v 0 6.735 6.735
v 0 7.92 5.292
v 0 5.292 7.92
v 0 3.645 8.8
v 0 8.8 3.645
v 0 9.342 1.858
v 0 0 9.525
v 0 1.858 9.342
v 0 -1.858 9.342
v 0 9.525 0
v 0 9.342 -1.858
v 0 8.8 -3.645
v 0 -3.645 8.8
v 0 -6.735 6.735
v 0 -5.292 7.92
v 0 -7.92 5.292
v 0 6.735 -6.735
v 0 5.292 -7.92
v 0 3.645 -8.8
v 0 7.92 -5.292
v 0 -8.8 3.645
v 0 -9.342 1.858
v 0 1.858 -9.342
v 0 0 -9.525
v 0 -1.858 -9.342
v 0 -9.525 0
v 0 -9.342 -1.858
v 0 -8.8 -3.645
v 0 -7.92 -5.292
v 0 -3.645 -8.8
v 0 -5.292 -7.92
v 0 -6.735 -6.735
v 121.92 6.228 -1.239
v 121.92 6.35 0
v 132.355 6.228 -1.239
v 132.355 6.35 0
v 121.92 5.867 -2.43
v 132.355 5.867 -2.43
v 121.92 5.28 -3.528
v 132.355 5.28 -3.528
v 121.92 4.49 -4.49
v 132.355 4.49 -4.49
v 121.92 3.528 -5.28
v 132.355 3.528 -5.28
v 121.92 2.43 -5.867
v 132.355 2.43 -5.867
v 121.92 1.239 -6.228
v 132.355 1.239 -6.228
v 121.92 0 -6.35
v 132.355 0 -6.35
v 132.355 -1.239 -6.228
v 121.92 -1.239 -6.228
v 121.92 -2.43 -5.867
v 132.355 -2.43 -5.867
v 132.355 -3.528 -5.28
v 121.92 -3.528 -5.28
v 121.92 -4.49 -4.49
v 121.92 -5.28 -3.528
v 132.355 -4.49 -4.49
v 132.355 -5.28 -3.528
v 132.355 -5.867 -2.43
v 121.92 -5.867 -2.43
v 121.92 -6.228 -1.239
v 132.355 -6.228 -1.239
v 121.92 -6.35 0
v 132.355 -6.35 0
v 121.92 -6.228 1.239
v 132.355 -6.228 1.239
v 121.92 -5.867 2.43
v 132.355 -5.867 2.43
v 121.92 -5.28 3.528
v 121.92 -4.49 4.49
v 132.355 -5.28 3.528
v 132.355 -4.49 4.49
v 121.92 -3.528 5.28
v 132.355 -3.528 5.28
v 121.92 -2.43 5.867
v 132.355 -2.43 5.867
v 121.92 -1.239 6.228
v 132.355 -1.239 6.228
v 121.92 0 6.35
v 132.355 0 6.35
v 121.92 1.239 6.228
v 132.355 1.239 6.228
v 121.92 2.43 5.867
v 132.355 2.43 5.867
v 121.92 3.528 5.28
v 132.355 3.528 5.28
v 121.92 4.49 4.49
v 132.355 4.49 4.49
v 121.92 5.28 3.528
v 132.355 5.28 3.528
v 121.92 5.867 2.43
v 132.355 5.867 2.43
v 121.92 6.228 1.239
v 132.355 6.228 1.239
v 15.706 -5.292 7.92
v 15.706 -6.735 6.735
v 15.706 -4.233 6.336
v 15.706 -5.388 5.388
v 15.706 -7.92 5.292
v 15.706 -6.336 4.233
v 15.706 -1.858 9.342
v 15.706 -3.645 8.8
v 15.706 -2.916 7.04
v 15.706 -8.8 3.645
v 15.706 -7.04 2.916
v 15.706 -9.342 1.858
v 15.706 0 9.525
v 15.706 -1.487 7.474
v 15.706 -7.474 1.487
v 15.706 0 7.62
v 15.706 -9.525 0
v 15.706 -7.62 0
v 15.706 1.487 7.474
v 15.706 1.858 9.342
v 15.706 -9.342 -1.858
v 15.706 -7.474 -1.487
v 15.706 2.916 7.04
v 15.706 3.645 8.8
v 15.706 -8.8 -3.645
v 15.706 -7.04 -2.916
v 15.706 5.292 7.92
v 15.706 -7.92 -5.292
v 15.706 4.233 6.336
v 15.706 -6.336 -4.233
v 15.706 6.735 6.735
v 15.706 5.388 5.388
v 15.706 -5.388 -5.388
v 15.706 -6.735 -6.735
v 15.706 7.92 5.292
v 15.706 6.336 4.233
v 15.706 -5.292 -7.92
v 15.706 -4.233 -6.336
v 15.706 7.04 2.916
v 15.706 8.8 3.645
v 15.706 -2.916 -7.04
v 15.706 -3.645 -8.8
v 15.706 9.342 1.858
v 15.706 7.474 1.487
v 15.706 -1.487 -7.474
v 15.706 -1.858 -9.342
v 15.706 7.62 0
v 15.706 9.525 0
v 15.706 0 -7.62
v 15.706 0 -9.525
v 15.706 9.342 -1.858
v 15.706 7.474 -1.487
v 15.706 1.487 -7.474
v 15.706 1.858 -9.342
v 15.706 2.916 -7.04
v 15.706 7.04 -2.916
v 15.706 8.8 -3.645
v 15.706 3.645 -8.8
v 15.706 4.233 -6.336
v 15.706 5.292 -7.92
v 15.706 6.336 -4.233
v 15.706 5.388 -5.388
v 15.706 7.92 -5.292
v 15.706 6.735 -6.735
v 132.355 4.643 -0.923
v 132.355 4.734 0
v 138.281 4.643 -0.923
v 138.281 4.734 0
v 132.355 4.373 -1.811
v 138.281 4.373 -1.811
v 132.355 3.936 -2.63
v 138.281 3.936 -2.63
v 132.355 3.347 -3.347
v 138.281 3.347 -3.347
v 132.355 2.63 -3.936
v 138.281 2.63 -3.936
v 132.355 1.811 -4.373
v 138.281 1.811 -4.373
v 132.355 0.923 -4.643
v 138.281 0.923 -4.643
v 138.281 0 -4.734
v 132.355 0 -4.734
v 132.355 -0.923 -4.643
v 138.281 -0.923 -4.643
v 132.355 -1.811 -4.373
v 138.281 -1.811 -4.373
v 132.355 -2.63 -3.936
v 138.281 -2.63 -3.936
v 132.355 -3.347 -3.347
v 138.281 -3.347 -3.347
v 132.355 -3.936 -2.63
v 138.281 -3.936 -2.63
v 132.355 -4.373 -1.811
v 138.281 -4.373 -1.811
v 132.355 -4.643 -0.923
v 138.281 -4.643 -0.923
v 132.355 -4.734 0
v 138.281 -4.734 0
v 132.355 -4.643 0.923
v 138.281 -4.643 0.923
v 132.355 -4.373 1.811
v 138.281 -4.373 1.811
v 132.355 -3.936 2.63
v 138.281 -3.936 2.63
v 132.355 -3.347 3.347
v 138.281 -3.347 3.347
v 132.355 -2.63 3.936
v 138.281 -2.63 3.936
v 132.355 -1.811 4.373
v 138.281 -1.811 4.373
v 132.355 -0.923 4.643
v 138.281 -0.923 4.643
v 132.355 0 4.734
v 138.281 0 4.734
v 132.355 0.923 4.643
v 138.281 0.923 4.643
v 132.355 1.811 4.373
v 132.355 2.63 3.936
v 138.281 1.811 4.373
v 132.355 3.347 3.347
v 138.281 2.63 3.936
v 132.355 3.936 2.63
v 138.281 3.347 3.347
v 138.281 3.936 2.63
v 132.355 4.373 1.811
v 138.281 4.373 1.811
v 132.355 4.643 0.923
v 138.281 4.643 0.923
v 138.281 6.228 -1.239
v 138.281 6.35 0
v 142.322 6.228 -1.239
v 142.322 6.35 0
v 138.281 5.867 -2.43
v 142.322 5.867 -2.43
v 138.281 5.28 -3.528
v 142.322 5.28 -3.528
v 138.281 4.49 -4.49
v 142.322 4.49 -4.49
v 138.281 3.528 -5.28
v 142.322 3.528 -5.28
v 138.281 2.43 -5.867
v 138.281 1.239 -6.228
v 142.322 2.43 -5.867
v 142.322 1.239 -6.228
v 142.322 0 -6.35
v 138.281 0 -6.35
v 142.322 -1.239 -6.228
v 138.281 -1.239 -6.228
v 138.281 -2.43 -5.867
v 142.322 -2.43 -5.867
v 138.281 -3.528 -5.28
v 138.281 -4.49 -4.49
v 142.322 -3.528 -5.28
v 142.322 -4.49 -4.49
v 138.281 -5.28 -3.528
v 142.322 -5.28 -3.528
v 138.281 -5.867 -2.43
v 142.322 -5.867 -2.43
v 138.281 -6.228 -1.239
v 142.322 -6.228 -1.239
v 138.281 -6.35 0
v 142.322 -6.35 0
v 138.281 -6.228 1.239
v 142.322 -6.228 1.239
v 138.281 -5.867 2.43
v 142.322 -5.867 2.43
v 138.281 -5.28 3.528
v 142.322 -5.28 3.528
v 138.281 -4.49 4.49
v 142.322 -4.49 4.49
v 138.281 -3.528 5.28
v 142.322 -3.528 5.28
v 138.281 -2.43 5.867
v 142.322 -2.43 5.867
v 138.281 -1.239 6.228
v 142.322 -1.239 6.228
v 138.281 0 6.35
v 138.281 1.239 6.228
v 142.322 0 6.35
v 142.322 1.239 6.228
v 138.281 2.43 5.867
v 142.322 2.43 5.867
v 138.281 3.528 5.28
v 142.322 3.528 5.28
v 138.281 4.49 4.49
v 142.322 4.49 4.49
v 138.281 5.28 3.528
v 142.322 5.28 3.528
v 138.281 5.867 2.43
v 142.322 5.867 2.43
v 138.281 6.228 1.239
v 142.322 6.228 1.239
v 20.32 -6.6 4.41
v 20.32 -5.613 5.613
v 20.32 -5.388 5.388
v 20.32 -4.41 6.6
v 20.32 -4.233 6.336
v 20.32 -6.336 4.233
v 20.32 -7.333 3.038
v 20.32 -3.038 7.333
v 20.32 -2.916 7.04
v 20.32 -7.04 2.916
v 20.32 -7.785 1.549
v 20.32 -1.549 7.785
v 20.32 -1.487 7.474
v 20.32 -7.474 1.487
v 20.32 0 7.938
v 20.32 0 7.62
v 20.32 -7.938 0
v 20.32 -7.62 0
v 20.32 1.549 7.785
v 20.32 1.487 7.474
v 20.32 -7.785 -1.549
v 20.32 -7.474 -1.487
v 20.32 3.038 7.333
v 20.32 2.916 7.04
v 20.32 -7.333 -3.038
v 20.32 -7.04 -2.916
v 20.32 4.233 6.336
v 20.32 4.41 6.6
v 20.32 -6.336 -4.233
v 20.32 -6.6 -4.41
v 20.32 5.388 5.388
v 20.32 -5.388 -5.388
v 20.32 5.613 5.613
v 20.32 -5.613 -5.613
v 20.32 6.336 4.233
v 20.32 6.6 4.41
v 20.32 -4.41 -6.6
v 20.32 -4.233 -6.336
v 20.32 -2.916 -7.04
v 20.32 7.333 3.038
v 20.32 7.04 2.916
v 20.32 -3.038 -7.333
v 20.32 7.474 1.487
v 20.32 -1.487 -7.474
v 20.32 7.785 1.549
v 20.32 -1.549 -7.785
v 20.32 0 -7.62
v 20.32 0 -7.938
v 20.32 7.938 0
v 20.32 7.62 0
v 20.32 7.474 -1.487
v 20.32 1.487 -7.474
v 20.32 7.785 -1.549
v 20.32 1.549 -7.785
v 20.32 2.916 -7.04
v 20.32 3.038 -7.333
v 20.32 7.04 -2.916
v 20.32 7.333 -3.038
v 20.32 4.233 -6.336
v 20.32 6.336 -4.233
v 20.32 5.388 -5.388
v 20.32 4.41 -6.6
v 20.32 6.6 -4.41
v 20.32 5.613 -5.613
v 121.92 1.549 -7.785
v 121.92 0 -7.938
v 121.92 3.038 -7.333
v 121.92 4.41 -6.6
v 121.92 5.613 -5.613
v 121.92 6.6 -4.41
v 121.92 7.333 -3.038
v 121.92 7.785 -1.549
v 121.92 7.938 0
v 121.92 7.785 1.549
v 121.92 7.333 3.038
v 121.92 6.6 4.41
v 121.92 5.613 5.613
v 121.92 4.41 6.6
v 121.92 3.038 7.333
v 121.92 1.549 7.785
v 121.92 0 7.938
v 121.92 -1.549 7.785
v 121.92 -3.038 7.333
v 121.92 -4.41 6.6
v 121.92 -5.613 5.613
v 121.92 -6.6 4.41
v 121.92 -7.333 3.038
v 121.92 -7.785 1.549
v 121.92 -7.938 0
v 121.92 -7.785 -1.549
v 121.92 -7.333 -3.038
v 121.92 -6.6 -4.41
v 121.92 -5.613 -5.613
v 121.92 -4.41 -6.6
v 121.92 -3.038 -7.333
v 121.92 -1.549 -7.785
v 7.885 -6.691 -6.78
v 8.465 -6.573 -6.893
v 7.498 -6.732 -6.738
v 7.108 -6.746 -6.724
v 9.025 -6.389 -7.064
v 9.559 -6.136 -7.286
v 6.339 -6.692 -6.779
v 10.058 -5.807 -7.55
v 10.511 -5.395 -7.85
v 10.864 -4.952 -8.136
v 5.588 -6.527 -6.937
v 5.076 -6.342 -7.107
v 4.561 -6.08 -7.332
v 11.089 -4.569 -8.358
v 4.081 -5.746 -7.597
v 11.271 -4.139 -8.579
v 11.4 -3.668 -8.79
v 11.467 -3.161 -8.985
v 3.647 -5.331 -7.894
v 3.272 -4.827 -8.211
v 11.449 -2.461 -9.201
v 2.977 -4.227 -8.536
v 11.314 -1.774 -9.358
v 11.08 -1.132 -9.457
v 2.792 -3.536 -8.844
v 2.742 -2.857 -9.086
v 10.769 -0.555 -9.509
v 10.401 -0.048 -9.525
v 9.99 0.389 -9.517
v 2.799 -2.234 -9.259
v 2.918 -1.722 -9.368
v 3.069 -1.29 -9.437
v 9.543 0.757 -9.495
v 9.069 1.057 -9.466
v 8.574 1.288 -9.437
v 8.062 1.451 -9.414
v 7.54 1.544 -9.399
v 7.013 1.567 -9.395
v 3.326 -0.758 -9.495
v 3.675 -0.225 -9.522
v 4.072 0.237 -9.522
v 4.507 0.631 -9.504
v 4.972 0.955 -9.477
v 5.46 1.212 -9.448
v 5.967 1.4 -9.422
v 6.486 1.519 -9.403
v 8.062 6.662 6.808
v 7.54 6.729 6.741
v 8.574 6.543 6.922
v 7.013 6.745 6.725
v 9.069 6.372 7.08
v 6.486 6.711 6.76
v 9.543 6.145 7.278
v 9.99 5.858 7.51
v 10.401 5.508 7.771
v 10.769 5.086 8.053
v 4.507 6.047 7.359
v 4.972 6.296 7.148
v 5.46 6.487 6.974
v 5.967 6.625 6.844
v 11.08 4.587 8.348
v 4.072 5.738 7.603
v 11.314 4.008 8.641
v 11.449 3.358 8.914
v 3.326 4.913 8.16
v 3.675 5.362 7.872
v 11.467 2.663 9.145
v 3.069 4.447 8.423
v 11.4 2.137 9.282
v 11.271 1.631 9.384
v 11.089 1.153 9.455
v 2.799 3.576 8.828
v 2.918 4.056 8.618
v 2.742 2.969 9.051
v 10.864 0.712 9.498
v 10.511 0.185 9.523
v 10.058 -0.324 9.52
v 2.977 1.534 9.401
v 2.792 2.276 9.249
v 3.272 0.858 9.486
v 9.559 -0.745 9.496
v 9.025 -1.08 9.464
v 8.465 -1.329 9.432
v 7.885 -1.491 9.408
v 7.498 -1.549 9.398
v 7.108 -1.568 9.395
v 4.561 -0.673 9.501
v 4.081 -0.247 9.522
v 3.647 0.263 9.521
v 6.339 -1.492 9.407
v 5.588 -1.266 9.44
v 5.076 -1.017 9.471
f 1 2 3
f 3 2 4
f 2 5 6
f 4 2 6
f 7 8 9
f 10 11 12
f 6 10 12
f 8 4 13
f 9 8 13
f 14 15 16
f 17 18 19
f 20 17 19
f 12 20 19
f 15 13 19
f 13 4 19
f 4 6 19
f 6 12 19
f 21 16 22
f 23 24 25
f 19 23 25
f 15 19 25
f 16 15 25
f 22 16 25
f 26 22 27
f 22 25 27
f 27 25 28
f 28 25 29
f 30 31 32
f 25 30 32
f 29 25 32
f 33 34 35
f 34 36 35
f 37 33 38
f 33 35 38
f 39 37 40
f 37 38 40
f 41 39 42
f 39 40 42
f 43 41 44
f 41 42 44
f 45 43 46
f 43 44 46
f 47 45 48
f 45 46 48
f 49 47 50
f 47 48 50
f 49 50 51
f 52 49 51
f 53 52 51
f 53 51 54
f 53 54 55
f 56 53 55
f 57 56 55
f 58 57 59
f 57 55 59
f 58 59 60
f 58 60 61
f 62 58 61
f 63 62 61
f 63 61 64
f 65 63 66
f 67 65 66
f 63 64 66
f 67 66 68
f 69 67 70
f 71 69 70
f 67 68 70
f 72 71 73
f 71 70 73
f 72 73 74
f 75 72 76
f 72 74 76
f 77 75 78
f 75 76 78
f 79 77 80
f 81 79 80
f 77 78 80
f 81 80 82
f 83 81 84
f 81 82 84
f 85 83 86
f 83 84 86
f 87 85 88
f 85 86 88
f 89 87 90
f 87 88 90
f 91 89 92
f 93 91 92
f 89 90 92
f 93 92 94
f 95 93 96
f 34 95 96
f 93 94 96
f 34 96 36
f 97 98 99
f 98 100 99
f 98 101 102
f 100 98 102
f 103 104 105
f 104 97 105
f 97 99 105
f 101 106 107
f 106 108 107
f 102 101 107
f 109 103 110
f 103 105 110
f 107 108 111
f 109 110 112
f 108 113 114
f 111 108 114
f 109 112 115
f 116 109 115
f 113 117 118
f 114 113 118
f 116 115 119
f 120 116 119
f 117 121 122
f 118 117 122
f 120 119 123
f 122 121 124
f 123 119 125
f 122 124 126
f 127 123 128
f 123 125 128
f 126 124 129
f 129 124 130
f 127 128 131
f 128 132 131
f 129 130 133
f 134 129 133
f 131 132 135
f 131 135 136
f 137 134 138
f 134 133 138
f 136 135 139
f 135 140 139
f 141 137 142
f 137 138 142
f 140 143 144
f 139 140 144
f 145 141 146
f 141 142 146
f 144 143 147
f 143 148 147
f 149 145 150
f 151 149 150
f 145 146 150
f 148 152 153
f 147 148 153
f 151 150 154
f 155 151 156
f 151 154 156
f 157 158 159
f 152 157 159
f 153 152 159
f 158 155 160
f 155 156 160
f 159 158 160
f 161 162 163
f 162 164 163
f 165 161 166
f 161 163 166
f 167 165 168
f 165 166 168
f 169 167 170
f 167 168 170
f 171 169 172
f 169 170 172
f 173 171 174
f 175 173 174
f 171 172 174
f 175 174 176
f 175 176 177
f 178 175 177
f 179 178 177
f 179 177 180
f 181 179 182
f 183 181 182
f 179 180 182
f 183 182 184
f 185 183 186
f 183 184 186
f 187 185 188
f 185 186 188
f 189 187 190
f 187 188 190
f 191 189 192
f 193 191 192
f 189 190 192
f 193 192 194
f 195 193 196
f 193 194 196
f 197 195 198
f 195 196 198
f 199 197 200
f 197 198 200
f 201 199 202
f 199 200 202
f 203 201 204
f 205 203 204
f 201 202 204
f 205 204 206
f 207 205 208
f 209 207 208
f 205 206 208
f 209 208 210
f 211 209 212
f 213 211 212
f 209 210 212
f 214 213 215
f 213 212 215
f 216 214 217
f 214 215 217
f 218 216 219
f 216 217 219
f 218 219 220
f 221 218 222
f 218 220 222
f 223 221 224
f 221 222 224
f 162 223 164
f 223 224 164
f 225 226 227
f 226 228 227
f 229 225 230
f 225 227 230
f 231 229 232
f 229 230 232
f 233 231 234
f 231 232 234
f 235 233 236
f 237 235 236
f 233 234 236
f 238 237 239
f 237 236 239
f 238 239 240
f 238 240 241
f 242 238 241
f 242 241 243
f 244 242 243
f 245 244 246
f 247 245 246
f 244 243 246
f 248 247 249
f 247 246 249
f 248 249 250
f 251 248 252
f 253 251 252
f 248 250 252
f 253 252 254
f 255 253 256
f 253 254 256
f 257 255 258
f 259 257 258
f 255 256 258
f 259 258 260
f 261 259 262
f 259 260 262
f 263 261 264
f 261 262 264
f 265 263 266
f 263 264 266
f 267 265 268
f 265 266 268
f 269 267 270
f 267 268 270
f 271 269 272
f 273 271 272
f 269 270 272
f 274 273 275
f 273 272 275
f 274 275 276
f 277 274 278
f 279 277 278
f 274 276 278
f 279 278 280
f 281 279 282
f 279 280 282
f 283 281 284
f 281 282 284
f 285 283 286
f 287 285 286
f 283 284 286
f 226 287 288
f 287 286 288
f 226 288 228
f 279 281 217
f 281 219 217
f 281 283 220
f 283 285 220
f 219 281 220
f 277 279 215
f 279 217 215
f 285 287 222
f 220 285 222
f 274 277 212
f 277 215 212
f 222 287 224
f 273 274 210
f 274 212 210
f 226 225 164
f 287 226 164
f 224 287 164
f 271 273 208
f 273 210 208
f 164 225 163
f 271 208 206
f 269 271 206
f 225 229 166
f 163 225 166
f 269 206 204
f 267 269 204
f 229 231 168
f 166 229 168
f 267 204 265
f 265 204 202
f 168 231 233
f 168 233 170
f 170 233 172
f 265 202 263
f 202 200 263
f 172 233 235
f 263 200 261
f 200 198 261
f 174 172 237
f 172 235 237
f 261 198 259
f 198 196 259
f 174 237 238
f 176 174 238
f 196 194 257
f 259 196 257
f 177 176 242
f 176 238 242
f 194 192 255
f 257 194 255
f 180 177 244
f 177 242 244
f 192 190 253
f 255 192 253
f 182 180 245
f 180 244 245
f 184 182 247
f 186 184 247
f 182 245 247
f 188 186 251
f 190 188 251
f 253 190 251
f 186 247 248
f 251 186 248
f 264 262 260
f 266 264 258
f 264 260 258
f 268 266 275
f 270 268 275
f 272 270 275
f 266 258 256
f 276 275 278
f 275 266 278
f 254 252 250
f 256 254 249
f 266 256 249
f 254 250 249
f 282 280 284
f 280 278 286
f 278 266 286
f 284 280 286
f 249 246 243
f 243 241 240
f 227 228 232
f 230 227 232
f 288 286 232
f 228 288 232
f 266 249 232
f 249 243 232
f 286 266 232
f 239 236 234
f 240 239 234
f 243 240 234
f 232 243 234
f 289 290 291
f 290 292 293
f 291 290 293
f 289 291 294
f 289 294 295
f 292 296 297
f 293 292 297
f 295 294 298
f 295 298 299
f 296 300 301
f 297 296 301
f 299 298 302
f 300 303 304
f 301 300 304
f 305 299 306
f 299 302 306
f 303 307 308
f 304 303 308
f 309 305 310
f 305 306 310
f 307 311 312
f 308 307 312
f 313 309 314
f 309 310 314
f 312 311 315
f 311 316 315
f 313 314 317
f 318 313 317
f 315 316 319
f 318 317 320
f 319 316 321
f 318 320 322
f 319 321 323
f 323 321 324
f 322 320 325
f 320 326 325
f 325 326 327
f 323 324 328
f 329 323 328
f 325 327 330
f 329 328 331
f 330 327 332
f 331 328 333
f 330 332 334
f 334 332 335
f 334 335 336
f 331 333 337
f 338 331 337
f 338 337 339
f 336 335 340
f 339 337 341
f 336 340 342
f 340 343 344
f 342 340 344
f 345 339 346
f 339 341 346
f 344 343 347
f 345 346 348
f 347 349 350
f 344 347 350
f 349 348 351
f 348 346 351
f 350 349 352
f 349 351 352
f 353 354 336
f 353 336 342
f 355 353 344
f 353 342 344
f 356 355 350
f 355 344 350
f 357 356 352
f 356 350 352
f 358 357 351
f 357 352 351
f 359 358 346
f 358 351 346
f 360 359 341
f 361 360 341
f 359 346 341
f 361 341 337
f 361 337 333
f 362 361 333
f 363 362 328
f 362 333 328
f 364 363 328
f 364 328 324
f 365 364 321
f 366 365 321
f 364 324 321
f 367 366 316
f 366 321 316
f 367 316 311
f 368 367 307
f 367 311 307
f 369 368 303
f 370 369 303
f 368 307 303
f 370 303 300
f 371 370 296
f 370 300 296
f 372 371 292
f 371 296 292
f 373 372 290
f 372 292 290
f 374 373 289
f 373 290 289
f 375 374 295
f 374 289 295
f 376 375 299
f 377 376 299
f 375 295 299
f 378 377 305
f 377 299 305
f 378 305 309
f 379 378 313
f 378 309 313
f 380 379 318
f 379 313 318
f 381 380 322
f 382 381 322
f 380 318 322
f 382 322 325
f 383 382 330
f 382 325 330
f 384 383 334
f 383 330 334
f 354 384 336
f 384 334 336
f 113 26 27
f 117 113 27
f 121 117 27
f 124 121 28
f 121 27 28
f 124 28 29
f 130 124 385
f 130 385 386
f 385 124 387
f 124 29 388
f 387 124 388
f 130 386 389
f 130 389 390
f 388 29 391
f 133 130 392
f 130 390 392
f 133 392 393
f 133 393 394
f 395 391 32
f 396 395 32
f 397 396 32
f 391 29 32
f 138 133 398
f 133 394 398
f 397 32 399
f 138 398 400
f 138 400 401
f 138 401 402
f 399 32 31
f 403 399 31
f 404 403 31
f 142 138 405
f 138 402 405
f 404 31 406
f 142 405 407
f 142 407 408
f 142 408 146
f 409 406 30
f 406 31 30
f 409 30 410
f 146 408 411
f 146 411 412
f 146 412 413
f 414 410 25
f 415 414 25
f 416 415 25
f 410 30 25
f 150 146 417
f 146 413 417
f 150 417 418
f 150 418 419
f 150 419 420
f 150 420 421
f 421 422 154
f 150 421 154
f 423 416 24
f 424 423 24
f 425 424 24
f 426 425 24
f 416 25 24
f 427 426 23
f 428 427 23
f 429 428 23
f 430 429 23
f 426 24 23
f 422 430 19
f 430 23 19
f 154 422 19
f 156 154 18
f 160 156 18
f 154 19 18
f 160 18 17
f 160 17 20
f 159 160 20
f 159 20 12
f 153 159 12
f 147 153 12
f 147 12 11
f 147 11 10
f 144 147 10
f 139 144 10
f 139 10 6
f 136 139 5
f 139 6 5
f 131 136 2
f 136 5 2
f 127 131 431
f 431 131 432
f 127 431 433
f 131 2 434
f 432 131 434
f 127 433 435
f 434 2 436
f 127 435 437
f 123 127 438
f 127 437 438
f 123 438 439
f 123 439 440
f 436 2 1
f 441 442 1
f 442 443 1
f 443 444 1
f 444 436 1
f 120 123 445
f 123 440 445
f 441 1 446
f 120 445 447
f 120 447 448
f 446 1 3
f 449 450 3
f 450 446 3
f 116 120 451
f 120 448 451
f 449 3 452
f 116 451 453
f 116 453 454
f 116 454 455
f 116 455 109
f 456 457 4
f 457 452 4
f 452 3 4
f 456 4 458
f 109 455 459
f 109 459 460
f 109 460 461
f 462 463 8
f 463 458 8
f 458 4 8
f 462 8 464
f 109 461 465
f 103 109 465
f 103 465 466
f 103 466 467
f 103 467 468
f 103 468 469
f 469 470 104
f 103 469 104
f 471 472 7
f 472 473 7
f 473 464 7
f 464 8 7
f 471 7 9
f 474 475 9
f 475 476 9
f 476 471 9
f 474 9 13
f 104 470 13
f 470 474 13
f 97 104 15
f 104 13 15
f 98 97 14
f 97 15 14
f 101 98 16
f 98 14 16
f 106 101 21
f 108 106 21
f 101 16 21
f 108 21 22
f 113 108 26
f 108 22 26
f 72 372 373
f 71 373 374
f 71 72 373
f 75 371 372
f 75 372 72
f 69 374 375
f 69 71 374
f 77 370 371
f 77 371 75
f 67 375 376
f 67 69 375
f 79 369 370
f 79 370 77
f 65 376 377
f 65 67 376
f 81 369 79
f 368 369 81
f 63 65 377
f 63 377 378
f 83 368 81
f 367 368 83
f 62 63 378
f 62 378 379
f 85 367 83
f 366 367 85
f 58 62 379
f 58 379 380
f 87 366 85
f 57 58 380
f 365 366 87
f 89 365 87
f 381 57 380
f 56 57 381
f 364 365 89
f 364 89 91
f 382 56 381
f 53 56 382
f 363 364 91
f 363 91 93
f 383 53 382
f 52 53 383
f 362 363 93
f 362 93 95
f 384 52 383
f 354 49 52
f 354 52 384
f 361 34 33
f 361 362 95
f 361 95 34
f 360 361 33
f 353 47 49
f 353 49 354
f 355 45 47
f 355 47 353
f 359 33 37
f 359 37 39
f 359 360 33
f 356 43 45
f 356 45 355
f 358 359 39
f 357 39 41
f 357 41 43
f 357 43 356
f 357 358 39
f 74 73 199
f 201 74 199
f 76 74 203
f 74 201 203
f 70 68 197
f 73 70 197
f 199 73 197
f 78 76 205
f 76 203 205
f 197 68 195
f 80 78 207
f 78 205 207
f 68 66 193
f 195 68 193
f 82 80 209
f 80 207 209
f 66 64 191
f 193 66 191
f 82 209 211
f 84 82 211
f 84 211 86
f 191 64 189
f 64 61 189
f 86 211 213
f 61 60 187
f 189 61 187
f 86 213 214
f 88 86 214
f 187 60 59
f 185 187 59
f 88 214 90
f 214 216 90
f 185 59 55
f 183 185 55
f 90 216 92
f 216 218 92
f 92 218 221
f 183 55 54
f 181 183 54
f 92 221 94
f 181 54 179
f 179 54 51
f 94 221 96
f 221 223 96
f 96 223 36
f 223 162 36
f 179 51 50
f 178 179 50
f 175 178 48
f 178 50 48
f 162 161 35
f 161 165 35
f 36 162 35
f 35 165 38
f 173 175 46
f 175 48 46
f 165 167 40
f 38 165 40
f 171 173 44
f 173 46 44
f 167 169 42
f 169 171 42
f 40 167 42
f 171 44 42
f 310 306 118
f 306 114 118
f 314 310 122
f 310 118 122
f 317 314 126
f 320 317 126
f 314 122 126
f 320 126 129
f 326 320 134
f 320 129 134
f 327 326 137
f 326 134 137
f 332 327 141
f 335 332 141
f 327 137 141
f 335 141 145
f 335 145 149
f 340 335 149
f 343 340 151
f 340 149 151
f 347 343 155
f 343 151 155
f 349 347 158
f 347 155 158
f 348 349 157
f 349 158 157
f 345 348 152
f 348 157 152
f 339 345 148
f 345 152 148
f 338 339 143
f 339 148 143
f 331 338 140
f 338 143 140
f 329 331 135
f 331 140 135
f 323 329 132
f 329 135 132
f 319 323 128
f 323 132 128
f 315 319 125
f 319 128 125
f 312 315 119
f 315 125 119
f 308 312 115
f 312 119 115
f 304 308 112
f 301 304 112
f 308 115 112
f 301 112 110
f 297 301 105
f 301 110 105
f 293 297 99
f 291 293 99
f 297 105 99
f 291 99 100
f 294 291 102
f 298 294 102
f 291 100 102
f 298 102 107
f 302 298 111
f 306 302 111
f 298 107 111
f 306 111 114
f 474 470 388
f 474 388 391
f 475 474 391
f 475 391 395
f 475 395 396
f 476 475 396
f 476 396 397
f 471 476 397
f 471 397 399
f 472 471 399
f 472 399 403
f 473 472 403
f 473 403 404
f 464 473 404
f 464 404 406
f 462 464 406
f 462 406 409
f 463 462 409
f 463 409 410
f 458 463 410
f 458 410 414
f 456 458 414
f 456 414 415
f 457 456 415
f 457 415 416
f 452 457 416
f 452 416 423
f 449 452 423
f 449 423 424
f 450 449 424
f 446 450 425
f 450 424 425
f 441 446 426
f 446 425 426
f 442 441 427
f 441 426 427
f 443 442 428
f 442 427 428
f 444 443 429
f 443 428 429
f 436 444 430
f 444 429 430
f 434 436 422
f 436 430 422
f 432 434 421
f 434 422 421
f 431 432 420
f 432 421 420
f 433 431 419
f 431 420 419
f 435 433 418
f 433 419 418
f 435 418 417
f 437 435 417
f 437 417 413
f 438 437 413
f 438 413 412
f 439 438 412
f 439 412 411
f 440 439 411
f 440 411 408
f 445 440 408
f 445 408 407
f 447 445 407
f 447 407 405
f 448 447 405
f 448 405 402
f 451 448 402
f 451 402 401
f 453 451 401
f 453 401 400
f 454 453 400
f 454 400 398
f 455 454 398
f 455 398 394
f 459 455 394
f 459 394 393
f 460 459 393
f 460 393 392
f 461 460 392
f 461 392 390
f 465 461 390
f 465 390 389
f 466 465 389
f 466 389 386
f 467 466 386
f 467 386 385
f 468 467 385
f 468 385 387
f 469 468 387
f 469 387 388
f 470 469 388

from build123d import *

# Parameters (mm, degrees)
SKETCH4_R                        = 7.9375
EXTRUDE1_DEPTH                   = 101.6
F_11_32_0_34375_DIAMETER_HOLE1_D = 8.73252


with BuildPart() as part:
    # Sketch1 → Revolve1 (revolve)
    with BuildSketch(Plane.XY):
        Polygon((0, 0), (20.32, 0), (20.32, -7.62), (15.706148476, -7.62), (15.706148476, -9.525), (0, -9.525), align=None)
    revolve(axis=Axis((158.75, 0, 0), (1, 0, 0)))

    # Sketch4 → Extrude1 (add)
    with BuildSketch(Plane(origin=(20.32, 0, 0), x_dir=(0, 0, -1), z_dir=(1, 0, 0))):
        Circle(SKETCH4_R)
    extrude(amount=EXTRUDE1_DEPTH)

    # Sketch5 → Revolve2 (revolve)
    with BuildSketch(Plane.XY):
        Polygon((121.92, 6.35), (132.354619201, 6.35), (132.354619201, 4.733622738), (138.281335828, 4.733622738), (138.281335828, 6.35), (142.322278983, 6.35), (142.322278983, 0), (121.92, 0), align=None)
    revolve(axis=Axis((142.322278983, 0, 0), (-1, 0, 0)))

    # 11/32 (0.34375) Diameter Hole1 (through all)
    with Locations(Plane(origin=(7.108304199, 2.913032452, 9.068619902), x_dir=(0, 0.952086079, -0.305830179), z_dir=(0, 0.305830179, 0.952086079))):
        with Locations((0, 0)):
            Hole(F_11_32_0_34375_DIAMETER_HOLE1_D / 2)


solid = part.part
